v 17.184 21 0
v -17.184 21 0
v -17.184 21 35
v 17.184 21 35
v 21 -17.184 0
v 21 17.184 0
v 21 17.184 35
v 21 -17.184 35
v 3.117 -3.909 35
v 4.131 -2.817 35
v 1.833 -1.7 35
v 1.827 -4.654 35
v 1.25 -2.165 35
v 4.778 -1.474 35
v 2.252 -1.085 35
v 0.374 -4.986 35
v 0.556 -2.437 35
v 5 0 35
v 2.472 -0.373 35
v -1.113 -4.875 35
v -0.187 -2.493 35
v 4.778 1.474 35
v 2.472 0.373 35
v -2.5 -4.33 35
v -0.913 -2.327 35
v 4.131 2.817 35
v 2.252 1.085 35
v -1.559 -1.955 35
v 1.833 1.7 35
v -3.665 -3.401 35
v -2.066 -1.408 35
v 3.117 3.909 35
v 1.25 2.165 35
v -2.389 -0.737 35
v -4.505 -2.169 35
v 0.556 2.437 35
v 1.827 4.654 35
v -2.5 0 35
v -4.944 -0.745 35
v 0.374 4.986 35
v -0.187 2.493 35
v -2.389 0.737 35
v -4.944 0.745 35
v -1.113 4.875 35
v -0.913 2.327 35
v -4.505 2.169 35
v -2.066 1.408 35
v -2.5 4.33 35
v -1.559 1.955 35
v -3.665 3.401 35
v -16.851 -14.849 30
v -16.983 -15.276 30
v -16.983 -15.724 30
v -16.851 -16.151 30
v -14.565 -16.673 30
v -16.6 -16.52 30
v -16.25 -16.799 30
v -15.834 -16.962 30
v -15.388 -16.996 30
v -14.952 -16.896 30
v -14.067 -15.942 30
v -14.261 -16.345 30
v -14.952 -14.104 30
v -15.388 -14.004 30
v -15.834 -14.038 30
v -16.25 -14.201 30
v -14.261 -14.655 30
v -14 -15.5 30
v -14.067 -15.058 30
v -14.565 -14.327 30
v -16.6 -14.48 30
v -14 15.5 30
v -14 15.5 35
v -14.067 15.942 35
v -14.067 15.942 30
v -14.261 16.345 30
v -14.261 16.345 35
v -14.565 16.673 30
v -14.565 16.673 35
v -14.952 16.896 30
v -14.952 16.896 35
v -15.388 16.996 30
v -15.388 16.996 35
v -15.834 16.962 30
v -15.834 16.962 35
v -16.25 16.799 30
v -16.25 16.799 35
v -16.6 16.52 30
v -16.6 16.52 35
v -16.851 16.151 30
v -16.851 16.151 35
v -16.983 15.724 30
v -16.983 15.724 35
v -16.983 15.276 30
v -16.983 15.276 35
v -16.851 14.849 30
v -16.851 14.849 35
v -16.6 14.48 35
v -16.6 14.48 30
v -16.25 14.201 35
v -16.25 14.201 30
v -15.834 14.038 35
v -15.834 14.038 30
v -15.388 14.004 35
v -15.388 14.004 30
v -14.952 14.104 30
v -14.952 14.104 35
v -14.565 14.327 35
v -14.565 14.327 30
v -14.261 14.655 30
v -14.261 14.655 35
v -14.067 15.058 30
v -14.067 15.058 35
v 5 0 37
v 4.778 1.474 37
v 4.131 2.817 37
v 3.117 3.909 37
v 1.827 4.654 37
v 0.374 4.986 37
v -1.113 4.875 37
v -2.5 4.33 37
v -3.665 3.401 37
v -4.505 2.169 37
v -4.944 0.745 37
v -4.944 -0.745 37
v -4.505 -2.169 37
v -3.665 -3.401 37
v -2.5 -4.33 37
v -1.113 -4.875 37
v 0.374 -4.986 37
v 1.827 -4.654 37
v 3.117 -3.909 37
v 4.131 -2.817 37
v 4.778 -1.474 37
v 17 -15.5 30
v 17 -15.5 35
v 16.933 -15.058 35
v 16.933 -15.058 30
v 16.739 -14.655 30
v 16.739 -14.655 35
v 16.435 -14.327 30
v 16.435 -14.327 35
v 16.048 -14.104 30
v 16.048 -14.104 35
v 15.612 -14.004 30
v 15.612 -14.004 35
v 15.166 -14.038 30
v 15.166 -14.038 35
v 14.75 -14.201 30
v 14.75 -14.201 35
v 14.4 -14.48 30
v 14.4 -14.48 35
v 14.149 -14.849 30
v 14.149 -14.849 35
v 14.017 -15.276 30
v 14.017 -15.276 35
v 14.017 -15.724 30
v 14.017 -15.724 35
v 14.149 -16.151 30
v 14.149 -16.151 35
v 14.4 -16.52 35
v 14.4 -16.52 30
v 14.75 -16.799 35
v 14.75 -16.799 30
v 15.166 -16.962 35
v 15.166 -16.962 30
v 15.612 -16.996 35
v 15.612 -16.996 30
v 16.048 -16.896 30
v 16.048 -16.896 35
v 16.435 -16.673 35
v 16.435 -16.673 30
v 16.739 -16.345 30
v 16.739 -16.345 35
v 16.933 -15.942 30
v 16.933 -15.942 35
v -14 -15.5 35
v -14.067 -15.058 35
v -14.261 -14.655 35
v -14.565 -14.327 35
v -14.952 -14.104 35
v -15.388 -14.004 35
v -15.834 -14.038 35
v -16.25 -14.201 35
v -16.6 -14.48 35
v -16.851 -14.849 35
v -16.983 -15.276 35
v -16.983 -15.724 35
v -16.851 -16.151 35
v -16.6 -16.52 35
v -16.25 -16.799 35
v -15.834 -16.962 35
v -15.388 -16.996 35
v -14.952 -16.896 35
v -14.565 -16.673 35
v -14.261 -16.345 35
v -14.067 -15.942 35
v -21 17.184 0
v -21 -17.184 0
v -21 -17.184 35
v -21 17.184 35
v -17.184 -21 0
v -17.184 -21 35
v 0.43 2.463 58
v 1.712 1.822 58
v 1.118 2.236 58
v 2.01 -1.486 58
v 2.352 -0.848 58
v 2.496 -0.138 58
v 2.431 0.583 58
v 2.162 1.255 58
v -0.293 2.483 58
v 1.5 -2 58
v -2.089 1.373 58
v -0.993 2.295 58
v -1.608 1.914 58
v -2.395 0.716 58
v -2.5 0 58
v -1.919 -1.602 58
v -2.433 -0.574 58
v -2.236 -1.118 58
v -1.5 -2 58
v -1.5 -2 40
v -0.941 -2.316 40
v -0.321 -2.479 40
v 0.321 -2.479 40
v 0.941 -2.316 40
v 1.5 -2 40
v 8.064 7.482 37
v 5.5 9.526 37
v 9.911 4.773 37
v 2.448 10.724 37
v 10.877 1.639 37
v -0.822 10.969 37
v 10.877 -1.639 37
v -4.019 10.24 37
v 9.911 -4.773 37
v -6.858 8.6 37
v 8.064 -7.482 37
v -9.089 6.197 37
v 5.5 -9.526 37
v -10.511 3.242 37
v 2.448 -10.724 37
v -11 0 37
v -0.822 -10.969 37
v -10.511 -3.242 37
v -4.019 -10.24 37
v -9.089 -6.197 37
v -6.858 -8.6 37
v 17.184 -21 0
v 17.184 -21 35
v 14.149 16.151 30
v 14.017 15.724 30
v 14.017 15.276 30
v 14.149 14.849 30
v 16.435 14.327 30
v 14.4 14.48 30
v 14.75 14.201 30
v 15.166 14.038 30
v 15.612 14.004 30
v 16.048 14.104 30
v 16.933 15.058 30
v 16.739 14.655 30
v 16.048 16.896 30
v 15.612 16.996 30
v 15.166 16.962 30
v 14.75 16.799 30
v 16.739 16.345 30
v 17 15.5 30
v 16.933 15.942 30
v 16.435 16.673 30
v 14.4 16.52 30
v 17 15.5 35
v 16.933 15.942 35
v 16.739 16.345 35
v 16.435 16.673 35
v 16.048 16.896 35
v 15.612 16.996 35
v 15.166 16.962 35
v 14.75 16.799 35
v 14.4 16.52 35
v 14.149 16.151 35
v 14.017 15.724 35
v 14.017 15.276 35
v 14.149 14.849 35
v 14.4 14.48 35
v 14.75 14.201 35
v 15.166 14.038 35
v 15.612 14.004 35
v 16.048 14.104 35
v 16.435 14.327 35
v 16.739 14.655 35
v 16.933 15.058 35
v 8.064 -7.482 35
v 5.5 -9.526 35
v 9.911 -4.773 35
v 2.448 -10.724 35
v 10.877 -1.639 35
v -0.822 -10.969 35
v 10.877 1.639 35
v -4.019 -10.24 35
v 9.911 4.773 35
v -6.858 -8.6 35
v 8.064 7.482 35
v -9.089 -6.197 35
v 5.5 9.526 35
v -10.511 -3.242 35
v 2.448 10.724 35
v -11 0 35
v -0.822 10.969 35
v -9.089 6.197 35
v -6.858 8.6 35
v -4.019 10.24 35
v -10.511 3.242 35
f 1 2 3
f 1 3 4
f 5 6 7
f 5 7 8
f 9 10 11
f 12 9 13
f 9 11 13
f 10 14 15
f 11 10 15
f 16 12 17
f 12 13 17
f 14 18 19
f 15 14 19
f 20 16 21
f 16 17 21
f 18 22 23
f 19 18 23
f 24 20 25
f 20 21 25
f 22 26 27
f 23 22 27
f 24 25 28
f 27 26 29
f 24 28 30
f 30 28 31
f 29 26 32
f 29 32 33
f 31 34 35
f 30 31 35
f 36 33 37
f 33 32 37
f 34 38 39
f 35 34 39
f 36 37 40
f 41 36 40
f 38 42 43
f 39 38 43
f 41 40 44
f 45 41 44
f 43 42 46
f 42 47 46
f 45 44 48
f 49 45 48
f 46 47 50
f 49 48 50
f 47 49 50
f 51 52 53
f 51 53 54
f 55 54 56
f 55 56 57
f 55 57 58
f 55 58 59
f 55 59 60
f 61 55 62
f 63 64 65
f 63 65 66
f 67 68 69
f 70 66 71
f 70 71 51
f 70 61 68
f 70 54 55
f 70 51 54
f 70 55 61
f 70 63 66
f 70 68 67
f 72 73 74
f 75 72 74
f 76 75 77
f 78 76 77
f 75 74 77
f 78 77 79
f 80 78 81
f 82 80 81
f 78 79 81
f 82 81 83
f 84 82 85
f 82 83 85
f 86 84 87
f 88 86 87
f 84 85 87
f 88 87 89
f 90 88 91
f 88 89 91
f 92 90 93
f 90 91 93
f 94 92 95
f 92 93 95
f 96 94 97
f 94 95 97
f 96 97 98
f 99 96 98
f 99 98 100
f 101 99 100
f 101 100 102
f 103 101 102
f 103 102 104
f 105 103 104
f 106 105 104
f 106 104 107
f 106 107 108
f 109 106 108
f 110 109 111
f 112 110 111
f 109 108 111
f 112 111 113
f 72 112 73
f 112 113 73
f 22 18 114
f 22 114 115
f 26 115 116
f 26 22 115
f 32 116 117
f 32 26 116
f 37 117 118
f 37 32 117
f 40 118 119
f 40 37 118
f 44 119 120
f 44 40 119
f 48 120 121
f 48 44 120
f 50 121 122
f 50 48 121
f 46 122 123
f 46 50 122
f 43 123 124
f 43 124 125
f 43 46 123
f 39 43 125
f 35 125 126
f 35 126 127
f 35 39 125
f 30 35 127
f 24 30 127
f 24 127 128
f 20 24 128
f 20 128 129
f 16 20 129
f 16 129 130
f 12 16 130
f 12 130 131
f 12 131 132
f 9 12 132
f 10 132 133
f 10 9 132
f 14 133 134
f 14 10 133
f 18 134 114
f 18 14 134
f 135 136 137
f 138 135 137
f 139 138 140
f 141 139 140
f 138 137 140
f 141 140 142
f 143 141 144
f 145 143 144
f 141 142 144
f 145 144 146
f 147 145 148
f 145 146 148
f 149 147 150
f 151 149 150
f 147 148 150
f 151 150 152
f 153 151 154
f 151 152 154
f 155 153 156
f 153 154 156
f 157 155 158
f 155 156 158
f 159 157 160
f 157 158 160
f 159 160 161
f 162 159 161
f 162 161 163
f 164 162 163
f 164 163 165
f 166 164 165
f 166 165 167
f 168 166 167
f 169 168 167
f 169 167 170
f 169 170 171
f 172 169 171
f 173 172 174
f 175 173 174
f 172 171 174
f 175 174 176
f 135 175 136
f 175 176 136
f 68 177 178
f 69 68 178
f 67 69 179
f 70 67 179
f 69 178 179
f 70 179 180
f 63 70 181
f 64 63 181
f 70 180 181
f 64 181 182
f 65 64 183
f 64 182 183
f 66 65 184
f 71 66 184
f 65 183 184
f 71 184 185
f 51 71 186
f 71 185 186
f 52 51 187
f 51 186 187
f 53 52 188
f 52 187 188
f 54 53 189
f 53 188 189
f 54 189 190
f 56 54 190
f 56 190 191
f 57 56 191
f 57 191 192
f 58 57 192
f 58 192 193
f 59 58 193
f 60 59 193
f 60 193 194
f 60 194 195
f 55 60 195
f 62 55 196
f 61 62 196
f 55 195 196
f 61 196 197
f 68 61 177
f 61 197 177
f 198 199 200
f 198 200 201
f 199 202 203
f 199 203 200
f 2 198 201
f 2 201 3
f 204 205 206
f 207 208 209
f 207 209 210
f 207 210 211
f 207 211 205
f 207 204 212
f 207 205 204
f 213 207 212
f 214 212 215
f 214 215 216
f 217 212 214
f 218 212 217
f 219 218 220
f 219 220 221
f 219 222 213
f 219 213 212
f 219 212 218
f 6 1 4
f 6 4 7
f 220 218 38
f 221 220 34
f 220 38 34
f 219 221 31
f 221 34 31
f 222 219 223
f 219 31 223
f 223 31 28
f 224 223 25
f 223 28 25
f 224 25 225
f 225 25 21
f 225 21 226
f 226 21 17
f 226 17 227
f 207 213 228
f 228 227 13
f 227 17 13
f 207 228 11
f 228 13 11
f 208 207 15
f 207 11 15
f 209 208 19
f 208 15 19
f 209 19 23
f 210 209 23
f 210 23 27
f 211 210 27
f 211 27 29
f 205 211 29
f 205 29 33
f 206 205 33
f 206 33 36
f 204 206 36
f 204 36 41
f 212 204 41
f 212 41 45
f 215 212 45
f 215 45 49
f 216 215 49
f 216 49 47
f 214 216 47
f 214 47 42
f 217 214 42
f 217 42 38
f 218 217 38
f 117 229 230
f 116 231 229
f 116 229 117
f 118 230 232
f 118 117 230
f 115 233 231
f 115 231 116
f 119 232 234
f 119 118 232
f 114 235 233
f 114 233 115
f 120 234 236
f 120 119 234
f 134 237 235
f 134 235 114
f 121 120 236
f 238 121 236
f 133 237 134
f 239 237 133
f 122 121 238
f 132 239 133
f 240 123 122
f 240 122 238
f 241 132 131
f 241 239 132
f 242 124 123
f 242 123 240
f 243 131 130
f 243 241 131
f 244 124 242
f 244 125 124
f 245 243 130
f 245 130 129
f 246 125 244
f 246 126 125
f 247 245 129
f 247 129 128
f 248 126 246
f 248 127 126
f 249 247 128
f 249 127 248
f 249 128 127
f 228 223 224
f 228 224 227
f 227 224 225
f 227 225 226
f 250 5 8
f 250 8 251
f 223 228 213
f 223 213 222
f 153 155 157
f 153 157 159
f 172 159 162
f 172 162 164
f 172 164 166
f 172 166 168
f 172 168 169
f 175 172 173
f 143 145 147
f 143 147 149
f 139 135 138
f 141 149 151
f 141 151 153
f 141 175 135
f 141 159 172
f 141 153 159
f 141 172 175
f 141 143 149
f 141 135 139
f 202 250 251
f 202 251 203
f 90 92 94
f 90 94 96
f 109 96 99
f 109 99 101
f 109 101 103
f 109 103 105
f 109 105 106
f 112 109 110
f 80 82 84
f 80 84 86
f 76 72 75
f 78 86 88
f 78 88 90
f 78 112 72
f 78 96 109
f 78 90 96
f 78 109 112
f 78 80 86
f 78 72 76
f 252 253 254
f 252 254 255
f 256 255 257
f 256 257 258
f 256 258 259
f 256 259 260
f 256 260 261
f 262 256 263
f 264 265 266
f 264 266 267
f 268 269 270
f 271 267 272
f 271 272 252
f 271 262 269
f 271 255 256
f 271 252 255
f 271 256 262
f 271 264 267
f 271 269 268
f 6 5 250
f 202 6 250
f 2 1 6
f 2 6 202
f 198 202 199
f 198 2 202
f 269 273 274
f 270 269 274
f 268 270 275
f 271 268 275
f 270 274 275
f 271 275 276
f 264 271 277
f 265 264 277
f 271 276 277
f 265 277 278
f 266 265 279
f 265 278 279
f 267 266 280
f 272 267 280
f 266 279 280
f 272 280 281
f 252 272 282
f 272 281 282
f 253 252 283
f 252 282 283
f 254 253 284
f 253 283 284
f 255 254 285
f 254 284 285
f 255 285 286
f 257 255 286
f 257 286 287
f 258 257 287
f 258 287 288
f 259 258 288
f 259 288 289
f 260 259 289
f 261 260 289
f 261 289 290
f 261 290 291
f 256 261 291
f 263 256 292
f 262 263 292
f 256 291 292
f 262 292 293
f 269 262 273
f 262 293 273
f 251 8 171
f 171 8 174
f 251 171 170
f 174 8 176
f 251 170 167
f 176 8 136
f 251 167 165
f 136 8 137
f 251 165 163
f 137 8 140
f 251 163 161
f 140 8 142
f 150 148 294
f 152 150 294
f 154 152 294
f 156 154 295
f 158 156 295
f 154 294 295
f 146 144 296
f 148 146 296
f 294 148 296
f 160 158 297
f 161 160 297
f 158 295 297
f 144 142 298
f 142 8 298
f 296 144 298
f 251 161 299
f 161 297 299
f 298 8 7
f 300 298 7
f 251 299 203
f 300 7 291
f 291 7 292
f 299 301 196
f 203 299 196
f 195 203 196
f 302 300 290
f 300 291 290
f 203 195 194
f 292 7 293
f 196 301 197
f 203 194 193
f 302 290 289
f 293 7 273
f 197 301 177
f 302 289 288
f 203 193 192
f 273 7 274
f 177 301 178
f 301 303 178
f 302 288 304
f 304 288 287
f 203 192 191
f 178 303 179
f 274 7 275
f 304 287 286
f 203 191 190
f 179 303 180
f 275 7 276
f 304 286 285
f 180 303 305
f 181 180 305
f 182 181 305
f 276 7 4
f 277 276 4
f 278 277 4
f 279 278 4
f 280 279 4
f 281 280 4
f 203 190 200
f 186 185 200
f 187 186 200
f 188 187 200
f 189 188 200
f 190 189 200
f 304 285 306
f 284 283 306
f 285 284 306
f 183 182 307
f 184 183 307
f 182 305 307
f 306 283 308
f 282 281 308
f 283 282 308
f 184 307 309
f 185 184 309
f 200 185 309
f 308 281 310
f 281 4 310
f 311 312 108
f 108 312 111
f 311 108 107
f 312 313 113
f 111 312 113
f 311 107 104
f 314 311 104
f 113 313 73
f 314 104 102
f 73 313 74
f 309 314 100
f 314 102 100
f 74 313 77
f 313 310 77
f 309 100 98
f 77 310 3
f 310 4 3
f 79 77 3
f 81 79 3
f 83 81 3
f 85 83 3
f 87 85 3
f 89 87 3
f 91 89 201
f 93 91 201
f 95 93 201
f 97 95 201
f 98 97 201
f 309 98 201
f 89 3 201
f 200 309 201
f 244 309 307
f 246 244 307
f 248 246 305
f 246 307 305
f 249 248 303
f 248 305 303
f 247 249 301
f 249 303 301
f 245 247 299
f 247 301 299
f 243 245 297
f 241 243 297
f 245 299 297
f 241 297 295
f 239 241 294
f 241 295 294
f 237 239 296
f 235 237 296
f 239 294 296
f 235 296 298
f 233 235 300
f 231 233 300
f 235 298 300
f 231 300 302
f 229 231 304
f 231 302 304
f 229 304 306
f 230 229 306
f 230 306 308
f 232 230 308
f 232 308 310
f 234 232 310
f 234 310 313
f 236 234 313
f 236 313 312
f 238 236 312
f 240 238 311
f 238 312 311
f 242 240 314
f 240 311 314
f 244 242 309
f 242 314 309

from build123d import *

# Parameters (mm, degrees)
EXTRUDE_1_DEPTH     = 35
SKETCH_2_R          = 11
SKETCH_2_R_2        = 5
EXTRUDE_2_DEPTH     = 2
SKETCH_3_R          = 2.5
EXTRUDE_3_DEPTH     = 23
CUT_EXTRUDE_START   = -18
CUT_EXTRUDE_1_DEPTH = 18
SKETCH_5_R          = 1.5
CUT_EXTRUDE_2_DEPTH = 5


with BuildPart() as part:
    # 草图1 → 凸台-拉伸1 (new body)
    with BuildSketch(Plane.XY):
        Polygon((-17.183766184, 21), (17.183766184, 21), (21, 17.183766184), (21, -17.183766184), (17.183766184, -21), (-17.183766184, -21), (-21, -17.183766184), (-21, 17.183766184), align=None)
    extrude(amount=EXTRUDE_1_DEPTH)

    # 草图2 → 凸台-拉伸2 (add)
    with BuildSketch(Plane.XY.offset(35)):
        with Locations(Location((0, 0, 0), (0, 0, 180))):
            Circle(SKETCH_2_R)
        Circle(SKETCH_2_R_2, mode=Mode.SUBTRACT)
    extrude(amount=EXTRUDE_2_DEPTH)

    # 草图3 → 凸台-拉伸3 (add)
    with BuildSketch(Plane.XY.offset(35)):
        with Locations(Location((0, 0, 0), (0, 0, 180))):
            Circle(SKETCH_3_R)
    extrude(amount=EXTRUDE_3_DEPTH)

    # 草图4 → 切除-拉伸1 (cut)
    with BuildSketch(Plane.XY.offset(58).offset(CUT_EXTRUDE_START)):
        with BuildLine():
            Line((1.5, -2), (-1.5, -2))
            ThreePointArc((-1.5, -2), (0, -2.5), (1.5, -2))
        make_face()
    extrude(amount=CUT_EXTRUDE_1_DEPTH, mode=Mode.SUBTRACT)

    # 草图5 → 切除-拉伸2 (cut)
    with BuildSketch(Plane.XY.offset(35)):
        with Locations((-15.5, 15.5)):
            Circle(SKETCH_5_R)
        with Locations((15.5, 15.5)):
            Circle(SKETCH_5_R)
        with Locations((15.5, -15.5)):
            Circle(SKETCH_5_R)
        with Locations((-15.5, -15.5)):
            Circle(SKETCH_5_R)
    extrude(amount=-CUT_EXTRUDE_2_DEPTH, mode=Mode.SUBTRACT)


solid = part.part
